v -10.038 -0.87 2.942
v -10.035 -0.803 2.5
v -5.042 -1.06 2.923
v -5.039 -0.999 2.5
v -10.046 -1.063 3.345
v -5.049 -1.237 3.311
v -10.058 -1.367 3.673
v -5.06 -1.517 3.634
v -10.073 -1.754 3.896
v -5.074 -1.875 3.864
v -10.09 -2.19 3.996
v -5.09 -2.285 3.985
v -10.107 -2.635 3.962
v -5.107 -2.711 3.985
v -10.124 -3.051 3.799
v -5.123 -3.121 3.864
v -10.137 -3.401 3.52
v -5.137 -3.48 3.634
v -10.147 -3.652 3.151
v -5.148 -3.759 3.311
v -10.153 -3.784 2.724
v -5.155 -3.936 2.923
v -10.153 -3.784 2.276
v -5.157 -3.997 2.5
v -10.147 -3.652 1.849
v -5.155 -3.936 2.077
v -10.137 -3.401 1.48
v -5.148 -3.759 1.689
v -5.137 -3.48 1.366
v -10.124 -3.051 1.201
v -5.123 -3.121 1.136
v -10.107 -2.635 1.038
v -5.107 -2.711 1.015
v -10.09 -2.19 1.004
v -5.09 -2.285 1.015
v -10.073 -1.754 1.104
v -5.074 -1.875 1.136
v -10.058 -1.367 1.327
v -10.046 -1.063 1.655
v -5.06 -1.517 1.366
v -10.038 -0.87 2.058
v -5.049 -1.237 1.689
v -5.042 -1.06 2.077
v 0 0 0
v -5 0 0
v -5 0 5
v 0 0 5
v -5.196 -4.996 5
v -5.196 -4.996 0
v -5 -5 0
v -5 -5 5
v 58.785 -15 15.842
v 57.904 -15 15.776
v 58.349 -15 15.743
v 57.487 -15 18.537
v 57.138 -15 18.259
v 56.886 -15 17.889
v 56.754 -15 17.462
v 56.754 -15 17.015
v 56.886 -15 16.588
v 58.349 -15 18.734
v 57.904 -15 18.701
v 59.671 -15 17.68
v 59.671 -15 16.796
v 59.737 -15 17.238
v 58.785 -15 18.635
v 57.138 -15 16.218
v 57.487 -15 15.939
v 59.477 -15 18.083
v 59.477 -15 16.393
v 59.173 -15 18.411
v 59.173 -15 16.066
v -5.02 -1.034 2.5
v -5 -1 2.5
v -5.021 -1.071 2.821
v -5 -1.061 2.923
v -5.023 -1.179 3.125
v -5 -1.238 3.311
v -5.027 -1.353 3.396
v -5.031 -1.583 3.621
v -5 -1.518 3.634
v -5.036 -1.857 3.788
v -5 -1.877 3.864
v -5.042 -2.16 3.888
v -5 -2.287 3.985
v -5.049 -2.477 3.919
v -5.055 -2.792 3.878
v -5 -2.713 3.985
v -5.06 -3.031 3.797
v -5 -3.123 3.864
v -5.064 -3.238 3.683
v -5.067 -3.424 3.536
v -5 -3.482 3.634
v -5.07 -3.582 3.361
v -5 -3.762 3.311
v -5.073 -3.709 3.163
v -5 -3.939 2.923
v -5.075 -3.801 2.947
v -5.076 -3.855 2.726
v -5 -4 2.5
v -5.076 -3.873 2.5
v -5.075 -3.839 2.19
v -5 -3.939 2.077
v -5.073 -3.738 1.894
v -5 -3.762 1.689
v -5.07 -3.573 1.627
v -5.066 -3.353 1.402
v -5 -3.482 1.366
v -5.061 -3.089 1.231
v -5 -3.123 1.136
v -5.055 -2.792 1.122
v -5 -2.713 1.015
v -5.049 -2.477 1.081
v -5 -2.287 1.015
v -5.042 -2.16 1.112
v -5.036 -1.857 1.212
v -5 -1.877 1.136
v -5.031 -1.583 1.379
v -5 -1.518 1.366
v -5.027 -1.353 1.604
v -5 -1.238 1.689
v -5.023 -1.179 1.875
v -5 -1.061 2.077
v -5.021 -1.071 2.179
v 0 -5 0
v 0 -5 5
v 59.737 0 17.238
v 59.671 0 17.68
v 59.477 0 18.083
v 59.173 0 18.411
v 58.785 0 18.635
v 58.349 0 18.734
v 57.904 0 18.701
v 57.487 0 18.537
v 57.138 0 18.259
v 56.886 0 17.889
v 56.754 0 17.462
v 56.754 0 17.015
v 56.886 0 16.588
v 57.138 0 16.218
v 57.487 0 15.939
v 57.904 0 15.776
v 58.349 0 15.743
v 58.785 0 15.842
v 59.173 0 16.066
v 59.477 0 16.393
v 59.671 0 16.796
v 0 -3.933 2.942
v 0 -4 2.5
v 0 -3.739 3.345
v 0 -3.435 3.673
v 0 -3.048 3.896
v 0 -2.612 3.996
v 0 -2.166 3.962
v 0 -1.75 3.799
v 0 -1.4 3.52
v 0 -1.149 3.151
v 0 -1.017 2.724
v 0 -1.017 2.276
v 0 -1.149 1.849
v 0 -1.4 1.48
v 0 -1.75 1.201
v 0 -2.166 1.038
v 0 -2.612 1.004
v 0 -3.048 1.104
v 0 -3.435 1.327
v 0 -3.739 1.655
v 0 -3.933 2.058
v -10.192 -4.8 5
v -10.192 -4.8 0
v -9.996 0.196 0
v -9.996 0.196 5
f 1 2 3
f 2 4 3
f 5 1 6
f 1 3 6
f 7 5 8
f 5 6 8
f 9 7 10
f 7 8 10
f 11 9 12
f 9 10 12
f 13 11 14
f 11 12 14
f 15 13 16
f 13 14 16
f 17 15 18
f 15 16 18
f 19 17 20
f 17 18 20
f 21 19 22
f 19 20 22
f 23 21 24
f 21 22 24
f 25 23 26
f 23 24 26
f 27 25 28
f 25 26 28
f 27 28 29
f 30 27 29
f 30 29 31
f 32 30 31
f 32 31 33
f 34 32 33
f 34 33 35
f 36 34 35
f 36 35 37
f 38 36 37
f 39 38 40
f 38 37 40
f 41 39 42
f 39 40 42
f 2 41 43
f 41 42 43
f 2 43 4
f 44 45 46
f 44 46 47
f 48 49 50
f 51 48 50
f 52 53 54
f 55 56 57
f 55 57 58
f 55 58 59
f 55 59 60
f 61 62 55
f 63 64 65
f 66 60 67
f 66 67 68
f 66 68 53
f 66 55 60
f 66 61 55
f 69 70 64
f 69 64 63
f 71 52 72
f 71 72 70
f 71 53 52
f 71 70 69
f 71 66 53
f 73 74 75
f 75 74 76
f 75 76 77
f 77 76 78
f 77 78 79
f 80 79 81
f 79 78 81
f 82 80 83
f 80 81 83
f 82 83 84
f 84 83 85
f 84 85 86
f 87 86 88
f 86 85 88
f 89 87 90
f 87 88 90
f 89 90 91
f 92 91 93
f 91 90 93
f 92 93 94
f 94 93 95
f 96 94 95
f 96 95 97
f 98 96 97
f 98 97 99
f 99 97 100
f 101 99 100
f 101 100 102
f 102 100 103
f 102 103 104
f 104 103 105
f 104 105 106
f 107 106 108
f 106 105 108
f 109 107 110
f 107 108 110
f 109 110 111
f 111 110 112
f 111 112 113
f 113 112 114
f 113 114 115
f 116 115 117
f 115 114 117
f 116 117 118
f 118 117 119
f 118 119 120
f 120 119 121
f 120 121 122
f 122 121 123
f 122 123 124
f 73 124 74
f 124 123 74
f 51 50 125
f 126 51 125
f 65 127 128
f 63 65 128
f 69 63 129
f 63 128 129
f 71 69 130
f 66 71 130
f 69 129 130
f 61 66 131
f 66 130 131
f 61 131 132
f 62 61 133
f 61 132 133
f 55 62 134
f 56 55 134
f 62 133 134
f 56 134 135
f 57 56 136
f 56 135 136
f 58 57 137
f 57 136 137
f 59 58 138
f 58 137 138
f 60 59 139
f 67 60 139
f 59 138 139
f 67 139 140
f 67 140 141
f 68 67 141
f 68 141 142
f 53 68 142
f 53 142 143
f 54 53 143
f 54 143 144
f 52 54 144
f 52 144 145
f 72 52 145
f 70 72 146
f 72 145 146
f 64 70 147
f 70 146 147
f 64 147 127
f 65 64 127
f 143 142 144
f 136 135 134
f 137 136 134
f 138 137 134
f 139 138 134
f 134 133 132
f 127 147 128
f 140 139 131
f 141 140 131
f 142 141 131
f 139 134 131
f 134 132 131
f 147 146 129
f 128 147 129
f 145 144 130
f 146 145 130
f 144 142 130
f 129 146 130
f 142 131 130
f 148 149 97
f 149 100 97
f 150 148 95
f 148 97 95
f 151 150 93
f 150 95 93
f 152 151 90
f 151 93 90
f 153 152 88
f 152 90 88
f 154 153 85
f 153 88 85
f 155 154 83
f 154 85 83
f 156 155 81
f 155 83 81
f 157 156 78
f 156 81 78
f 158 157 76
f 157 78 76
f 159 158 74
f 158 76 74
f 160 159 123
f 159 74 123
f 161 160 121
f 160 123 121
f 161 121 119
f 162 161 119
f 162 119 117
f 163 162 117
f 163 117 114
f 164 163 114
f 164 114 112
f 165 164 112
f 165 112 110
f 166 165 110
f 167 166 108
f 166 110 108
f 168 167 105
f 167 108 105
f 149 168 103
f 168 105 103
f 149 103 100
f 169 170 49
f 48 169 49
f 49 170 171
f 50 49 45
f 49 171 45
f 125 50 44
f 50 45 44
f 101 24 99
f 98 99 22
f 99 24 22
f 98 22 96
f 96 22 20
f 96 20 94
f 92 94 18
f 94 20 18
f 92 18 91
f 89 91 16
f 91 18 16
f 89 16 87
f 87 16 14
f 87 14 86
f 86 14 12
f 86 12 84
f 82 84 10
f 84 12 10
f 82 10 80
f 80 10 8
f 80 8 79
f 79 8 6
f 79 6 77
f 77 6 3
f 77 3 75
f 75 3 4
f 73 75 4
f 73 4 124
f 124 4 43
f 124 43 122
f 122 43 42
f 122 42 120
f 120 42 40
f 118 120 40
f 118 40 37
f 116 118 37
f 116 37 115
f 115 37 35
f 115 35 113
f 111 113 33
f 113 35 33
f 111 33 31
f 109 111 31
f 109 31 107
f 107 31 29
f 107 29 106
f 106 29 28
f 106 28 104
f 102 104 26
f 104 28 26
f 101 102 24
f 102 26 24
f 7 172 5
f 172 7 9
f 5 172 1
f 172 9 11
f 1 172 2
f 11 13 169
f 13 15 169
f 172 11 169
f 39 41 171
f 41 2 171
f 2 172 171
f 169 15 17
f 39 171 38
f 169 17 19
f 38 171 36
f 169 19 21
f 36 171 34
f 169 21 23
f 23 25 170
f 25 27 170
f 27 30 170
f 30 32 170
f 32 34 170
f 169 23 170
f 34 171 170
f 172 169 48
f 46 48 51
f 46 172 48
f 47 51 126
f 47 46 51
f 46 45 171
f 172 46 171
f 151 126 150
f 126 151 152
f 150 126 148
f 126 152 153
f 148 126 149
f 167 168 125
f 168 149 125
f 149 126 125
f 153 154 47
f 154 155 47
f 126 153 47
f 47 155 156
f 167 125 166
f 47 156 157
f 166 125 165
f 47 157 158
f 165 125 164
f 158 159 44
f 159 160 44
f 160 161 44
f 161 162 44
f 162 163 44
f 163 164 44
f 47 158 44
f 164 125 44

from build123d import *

# Parameters (mm, degrees)
F0_W           = 5
F0_H           = 5
F1_DEPTH       = 5
F4_D           = 3
F4_DEPTH       = 5
F4_TIP         = 0.9012909285
F4_ON_F2_D     = 3
F4_ON_F2_DEPTH = 5
F4_ON_F2_TIP   = 0.9012909285
F5_R           = 1.5
F6_DEPTH       = 15


with BuildPart() as f1:
    # F0 (on Top) → F1 (new body)
    with BuildSketch(Plane.XY):
        with Locations((-2.5, -2.5)):
            Rectangle(F0_W, F0_H)
        Polygon((-5.1962990788, -4.9961451812), (-5, 0), (-9.9961451812, 0.1962990788), (-10.19244426, -4.7998461024), align=None)
        Polygon((-5, -5), (-5, 0), (-5.1962990788, -4.9961451812), align=None)
    extrude(amount=F1_DEPTH)

    # F4
    with Locations(Plane.YZ):
        with Locations((-2.5, 2.5)):
            Hole(F4_D / 2, depth=F4_DEPTH)
            with Locations((0, 0, -(F4_DEPTH + F4_TIP / 2))):  # 118° drill point
                Cone(0, F4_D / 2, F4_TIP, mode=Mode.SUBTRACT)

    # F4 on F2
    with Locations(Plane(origin=(-9.9884385155, 0.3924468181, 0), x_dir=(-0.0392598158, -0.9992290362, 0), z_dir=(-0.9992290362, 0.0392598158, 0))):
        with Locations((2.6962990788, 2.5)):
            Hole(F4_ON_F2_D / 2, depth=F4_ON_F2_DEPTH)
            with Locations((0, 0, -(F4_ON_F2_DEPTH + F4_ON_F2_TIP / 2))):  # 118° drill point
                Cone(0, F4_ON_F2_D / 2, F4_ON_F2_TIP, mode=Mode.SUBTRACT)


with BuildPart() as f6:
    # F5 (on Front) → F6 (new body)
    with BuildSketch(Plane.XZ):
        with Locations((58.2373477519, 17.2383319587)):
            Circle(F5_R)
    extrude(amount=F6_DEPTH)


solid = Compound([f1.part, f6.part])
